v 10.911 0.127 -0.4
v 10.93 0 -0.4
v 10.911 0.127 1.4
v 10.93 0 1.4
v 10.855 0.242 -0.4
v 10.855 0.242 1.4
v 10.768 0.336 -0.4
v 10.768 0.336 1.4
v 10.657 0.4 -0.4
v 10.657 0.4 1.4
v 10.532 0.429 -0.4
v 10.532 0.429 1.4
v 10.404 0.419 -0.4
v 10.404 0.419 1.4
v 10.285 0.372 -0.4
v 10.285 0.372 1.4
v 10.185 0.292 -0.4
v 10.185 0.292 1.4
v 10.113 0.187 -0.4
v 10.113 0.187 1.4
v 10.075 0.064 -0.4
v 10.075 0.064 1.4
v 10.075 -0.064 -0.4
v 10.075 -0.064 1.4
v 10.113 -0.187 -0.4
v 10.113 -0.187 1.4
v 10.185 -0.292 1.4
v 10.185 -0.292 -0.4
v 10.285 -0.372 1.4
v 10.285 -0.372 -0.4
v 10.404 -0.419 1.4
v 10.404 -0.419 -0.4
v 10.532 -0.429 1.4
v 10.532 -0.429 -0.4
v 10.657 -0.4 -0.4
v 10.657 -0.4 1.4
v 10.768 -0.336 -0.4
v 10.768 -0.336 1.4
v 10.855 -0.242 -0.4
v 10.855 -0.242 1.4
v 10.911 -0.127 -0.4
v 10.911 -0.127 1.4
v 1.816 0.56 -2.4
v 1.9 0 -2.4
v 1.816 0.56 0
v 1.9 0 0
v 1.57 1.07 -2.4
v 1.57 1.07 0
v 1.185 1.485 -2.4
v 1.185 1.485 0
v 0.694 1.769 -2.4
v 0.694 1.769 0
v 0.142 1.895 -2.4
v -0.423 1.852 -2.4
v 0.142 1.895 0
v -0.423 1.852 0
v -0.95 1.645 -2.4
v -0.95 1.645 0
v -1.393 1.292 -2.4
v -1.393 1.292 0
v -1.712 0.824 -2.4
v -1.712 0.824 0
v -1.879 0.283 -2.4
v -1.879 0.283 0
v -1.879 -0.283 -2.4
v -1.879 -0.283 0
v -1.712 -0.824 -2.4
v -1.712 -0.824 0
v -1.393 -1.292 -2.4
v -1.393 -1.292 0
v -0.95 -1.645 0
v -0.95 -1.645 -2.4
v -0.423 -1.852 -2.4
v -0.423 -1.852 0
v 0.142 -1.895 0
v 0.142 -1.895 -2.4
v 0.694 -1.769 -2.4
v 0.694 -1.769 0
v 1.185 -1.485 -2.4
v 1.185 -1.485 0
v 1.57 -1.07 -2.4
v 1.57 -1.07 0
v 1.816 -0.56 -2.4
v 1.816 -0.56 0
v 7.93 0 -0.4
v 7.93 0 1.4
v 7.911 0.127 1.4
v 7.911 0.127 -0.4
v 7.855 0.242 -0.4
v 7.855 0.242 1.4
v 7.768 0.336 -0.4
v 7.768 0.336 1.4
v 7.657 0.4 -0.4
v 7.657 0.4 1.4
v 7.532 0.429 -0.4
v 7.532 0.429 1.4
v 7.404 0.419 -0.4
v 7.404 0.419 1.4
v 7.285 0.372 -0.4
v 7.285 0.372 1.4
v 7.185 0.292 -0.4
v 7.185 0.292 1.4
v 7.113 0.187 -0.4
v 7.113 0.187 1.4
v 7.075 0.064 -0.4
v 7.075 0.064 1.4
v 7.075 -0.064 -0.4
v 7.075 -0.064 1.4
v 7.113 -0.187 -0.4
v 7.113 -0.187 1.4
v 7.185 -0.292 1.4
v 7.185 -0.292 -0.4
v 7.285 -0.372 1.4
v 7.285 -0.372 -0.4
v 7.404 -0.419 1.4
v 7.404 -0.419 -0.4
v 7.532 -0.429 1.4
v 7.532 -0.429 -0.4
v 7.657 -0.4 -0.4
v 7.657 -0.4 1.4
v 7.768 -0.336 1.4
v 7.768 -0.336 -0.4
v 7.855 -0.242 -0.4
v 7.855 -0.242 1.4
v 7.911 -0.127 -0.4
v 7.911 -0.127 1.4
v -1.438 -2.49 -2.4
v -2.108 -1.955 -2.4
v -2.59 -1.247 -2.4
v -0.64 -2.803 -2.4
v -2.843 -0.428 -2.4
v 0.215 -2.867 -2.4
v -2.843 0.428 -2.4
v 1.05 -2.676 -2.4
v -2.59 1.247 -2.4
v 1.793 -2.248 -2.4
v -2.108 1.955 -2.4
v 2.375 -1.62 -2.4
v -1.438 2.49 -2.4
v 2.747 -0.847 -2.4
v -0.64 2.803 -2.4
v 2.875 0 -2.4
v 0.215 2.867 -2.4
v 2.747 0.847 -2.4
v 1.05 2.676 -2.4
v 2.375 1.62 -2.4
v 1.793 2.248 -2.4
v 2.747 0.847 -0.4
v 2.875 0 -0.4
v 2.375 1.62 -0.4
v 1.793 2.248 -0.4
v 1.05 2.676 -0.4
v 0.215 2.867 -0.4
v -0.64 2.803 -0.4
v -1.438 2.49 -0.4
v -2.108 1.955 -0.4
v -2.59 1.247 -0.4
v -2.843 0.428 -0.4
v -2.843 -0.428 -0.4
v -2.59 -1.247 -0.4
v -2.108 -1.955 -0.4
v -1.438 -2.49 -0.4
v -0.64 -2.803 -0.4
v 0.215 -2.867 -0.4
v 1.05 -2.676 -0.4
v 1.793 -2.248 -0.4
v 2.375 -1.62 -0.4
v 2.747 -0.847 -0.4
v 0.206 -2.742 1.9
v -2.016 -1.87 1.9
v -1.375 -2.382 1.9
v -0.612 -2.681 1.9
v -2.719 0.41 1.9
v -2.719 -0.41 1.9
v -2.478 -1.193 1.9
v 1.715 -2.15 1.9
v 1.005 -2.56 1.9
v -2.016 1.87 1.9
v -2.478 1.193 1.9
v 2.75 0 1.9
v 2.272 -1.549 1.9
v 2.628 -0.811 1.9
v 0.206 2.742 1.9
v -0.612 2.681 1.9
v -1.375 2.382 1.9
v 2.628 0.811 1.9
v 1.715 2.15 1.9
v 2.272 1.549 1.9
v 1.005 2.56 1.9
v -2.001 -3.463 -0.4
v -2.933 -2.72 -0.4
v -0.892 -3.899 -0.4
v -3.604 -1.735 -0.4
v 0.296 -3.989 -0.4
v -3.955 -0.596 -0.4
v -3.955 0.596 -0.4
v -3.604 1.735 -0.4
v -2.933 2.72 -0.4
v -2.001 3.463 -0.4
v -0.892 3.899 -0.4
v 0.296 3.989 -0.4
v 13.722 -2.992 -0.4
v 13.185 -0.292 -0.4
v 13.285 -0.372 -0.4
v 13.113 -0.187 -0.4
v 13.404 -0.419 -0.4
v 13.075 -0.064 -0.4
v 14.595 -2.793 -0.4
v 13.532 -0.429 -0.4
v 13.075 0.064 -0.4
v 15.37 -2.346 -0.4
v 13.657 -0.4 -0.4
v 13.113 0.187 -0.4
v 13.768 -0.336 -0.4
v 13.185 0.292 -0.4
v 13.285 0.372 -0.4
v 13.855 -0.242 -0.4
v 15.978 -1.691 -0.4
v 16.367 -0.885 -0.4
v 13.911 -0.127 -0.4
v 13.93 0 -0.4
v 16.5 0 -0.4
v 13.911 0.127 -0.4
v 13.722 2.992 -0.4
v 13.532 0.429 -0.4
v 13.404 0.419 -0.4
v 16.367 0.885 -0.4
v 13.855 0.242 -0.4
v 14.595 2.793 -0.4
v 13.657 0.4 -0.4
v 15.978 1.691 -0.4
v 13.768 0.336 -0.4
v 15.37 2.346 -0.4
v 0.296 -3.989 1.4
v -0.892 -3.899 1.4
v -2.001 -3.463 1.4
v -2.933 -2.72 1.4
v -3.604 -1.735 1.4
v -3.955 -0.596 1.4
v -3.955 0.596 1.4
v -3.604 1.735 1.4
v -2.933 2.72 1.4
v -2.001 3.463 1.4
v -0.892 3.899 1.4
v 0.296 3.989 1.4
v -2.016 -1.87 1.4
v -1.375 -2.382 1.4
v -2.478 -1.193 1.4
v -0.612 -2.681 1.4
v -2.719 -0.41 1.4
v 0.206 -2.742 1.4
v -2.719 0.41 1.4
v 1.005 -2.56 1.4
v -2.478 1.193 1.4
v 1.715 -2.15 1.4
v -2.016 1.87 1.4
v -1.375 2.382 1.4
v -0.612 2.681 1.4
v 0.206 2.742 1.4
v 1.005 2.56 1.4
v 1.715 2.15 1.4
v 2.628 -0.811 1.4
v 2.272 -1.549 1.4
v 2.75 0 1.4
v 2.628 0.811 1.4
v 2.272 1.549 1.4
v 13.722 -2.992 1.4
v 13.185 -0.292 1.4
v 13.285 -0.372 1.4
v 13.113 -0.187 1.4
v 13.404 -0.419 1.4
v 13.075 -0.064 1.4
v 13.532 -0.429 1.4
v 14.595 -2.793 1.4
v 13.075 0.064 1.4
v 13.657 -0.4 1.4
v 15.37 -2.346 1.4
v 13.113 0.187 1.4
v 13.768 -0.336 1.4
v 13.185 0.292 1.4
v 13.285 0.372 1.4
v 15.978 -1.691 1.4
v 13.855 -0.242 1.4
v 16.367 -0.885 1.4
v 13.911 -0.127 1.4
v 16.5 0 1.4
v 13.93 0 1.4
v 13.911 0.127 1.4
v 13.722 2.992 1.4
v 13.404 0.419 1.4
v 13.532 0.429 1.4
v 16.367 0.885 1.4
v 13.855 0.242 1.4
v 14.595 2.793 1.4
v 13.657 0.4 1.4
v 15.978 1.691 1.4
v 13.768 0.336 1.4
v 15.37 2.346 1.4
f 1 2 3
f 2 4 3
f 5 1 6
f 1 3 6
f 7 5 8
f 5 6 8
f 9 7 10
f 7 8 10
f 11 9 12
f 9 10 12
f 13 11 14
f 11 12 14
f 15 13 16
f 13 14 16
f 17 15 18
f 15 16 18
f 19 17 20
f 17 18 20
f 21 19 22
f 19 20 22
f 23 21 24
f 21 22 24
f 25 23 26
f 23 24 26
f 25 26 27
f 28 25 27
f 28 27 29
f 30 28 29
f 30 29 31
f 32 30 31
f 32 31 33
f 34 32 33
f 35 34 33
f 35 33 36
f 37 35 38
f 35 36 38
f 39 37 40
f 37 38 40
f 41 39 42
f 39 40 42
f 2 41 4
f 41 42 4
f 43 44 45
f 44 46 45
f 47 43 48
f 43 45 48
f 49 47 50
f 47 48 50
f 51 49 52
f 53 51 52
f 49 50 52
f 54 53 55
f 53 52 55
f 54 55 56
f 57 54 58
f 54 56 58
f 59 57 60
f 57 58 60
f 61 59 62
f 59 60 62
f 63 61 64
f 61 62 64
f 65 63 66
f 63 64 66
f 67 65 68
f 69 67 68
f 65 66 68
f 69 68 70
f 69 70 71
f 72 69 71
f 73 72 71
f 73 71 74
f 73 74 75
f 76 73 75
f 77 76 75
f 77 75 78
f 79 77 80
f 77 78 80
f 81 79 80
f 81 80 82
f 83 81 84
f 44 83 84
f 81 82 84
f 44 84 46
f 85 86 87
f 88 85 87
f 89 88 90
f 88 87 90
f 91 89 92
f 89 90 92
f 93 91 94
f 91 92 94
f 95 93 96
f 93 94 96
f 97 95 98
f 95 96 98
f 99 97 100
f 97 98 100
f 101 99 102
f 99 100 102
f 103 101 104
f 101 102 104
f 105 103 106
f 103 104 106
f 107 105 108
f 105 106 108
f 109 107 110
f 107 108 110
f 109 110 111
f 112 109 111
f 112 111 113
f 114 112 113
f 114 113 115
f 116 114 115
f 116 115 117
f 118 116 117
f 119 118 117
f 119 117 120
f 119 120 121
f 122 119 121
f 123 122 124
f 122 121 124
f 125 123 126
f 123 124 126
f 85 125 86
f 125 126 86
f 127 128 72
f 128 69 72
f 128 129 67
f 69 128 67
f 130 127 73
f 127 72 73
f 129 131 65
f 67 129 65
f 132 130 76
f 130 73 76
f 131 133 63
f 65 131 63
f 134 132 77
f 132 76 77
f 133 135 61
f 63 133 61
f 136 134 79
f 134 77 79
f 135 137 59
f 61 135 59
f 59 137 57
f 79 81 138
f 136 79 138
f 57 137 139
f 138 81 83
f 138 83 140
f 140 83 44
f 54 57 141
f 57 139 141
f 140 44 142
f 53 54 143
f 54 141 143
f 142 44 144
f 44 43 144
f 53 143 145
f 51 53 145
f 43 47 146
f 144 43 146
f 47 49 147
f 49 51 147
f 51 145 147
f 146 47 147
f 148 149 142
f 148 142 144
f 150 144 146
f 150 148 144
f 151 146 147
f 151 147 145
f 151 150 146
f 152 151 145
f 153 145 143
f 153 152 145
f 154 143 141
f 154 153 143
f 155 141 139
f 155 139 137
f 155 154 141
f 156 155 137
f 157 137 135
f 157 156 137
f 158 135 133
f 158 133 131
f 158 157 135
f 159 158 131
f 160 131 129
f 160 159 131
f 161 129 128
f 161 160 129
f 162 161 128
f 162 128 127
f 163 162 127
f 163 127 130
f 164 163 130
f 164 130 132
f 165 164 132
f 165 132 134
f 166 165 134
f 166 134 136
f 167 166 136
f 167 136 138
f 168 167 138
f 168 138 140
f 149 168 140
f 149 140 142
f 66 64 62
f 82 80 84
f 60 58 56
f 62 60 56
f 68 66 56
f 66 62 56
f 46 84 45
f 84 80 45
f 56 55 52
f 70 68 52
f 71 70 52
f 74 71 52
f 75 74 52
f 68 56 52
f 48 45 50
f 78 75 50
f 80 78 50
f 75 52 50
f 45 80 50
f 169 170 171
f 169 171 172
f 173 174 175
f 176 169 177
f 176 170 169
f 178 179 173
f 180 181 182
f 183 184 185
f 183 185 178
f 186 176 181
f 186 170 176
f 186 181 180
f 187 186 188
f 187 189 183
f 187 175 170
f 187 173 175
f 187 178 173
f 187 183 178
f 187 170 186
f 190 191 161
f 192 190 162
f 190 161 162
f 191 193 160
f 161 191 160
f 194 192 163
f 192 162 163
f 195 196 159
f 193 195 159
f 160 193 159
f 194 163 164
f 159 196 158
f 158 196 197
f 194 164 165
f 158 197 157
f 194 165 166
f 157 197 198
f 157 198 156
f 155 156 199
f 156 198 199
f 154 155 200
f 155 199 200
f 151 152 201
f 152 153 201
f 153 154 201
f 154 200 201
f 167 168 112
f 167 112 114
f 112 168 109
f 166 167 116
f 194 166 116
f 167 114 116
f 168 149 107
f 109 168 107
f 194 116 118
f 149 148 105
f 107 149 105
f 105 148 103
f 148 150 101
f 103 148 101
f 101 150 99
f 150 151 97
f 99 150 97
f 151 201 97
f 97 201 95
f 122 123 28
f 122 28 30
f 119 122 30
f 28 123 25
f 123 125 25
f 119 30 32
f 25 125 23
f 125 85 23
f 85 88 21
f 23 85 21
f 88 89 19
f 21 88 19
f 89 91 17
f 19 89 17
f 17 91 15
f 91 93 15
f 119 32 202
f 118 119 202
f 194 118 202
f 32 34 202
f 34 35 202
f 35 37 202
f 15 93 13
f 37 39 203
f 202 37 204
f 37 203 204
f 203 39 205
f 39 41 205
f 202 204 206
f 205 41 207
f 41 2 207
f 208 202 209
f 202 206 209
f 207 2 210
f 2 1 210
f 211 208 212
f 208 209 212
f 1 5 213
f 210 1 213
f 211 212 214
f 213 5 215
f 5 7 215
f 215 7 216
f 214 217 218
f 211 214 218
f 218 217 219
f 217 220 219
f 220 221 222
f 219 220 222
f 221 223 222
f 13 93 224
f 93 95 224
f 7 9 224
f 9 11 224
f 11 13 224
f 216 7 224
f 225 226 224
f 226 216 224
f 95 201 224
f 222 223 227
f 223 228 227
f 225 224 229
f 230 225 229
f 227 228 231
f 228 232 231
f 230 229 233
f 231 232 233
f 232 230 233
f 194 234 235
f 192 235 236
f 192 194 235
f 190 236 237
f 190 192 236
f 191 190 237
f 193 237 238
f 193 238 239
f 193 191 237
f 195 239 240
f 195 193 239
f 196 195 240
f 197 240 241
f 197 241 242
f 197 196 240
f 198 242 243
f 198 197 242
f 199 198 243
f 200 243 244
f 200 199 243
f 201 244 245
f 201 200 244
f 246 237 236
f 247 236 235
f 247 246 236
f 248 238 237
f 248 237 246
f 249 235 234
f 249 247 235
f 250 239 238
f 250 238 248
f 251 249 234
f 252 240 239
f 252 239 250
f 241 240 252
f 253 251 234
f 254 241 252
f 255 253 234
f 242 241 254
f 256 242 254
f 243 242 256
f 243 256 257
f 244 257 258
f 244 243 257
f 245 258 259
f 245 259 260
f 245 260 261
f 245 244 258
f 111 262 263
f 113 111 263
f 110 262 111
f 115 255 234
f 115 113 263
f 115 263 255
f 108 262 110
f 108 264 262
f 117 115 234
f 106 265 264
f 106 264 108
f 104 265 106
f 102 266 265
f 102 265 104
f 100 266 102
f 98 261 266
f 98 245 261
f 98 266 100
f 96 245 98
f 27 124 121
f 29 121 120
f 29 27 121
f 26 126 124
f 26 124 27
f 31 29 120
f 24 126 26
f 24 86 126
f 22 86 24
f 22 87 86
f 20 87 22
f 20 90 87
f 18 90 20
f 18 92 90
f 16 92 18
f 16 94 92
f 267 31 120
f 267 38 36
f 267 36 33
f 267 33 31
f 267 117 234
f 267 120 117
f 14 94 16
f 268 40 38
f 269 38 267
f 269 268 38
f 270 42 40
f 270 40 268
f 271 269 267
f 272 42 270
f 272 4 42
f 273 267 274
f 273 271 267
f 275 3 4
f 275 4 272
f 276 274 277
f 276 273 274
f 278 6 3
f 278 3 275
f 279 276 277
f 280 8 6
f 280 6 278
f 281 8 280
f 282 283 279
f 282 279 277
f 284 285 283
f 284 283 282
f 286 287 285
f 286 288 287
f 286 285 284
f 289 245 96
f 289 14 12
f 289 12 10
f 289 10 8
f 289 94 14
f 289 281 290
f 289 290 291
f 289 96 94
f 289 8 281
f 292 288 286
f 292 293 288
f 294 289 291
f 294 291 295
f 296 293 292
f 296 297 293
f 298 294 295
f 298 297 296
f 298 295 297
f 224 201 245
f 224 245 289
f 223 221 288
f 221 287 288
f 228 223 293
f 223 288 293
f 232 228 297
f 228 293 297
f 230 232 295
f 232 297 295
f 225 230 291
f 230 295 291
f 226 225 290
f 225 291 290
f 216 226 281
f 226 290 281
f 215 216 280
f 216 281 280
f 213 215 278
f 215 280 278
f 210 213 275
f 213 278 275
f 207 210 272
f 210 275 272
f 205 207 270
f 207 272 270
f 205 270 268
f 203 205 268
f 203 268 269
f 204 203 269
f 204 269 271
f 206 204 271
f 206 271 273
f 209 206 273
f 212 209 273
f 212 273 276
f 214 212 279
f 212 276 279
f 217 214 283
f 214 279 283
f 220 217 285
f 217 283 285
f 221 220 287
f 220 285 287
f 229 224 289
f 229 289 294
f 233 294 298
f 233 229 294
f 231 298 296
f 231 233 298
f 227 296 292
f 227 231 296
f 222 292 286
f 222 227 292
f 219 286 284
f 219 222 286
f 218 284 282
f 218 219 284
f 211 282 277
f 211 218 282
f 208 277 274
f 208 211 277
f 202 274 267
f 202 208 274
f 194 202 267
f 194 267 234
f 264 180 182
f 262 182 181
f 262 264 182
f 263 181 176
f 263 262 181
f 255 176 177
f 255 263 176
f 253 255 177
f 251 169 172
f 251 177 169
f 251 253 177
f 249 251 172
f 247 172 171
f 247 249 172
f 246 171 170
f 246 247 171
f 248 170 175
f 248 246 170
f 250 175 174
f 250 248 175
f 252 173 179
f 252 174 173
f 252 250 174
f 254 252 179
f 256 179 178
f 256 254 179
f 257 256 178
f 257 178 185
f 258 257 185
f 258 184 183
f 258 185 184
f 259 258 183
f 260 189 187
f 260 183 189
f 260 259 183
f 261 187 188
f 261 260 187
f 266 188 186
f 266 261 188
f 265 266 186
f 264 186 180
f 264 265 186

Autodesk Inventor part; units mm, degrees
sketch "スケッチ1" plane through (0, 0, 0) normal (0, 0, 1) x (1, 0, 0)
  circle A0 centre (0, 0) radius 2.875
  dimension "d0" = 5.75
extrude "押し出し1" add sketch "スケッチ1" against normal blind 2.4
sketch "スケッチ2" plane through (0, 0, 0) normal (0, 0, 1) x (1, 0, 0)
  circle A0 centre (0, 0) radius 2.75
  dimension "d3" = 5.5
extrude "押し出し2" add sketch "スケッチ2" along normal blind 1.9
sketch "スケッチ3" plane through (0, 0, 0) normal (0, 0, 1) x (1, 0, 0)
  circle A0 centre (0, 0) radius 4
  circle A1 centre (13.5, 0) radius 3
  line L0 (-5.7629, 0) -> (13.5774, 0) projected
  line L1 (0.2963, 3.989) -> (13.7222, 2.9918)
  line L2 (13.7222, -2.9918) -> (0.2963, -3.989)
  dimension "d6" = 8
  dimension "d7" = 6
  dimension "d8" = 13.5
extrude "押し出し3" add sketch "スケッチ3" along normal blind 1.4 and the other way blind 0.4
sketch "スケッチ4" plane through (0, 0, 0) normal (0, 0, 1) x (1, 0, 0)
  circle A0 centre (13.5, 0) radius 0.43
  point P0 (0, 0)
  dimension "d13" = 0.86
  dimension "d15" = 13.5
extrude "押し出し4" cut sketch "スケッチ4" along normal through all both and the other way through all
sketch "スケッチ5" plane through (0, 0, 0) normal (0, 0, 1) x (1, 0, 0)
  circle A0 centre (0, 0) radius 1.9
  dimension "d22" = 3.8
extrude "押し出し5" cut sketch "スケッチ5" against normal through all
pattern_linear "矩形状パターン1" count 3 spacing 3 along (-1, 0, 0) of "押し出し4"
properties part number "ASV-15MGSingleHorn01"
